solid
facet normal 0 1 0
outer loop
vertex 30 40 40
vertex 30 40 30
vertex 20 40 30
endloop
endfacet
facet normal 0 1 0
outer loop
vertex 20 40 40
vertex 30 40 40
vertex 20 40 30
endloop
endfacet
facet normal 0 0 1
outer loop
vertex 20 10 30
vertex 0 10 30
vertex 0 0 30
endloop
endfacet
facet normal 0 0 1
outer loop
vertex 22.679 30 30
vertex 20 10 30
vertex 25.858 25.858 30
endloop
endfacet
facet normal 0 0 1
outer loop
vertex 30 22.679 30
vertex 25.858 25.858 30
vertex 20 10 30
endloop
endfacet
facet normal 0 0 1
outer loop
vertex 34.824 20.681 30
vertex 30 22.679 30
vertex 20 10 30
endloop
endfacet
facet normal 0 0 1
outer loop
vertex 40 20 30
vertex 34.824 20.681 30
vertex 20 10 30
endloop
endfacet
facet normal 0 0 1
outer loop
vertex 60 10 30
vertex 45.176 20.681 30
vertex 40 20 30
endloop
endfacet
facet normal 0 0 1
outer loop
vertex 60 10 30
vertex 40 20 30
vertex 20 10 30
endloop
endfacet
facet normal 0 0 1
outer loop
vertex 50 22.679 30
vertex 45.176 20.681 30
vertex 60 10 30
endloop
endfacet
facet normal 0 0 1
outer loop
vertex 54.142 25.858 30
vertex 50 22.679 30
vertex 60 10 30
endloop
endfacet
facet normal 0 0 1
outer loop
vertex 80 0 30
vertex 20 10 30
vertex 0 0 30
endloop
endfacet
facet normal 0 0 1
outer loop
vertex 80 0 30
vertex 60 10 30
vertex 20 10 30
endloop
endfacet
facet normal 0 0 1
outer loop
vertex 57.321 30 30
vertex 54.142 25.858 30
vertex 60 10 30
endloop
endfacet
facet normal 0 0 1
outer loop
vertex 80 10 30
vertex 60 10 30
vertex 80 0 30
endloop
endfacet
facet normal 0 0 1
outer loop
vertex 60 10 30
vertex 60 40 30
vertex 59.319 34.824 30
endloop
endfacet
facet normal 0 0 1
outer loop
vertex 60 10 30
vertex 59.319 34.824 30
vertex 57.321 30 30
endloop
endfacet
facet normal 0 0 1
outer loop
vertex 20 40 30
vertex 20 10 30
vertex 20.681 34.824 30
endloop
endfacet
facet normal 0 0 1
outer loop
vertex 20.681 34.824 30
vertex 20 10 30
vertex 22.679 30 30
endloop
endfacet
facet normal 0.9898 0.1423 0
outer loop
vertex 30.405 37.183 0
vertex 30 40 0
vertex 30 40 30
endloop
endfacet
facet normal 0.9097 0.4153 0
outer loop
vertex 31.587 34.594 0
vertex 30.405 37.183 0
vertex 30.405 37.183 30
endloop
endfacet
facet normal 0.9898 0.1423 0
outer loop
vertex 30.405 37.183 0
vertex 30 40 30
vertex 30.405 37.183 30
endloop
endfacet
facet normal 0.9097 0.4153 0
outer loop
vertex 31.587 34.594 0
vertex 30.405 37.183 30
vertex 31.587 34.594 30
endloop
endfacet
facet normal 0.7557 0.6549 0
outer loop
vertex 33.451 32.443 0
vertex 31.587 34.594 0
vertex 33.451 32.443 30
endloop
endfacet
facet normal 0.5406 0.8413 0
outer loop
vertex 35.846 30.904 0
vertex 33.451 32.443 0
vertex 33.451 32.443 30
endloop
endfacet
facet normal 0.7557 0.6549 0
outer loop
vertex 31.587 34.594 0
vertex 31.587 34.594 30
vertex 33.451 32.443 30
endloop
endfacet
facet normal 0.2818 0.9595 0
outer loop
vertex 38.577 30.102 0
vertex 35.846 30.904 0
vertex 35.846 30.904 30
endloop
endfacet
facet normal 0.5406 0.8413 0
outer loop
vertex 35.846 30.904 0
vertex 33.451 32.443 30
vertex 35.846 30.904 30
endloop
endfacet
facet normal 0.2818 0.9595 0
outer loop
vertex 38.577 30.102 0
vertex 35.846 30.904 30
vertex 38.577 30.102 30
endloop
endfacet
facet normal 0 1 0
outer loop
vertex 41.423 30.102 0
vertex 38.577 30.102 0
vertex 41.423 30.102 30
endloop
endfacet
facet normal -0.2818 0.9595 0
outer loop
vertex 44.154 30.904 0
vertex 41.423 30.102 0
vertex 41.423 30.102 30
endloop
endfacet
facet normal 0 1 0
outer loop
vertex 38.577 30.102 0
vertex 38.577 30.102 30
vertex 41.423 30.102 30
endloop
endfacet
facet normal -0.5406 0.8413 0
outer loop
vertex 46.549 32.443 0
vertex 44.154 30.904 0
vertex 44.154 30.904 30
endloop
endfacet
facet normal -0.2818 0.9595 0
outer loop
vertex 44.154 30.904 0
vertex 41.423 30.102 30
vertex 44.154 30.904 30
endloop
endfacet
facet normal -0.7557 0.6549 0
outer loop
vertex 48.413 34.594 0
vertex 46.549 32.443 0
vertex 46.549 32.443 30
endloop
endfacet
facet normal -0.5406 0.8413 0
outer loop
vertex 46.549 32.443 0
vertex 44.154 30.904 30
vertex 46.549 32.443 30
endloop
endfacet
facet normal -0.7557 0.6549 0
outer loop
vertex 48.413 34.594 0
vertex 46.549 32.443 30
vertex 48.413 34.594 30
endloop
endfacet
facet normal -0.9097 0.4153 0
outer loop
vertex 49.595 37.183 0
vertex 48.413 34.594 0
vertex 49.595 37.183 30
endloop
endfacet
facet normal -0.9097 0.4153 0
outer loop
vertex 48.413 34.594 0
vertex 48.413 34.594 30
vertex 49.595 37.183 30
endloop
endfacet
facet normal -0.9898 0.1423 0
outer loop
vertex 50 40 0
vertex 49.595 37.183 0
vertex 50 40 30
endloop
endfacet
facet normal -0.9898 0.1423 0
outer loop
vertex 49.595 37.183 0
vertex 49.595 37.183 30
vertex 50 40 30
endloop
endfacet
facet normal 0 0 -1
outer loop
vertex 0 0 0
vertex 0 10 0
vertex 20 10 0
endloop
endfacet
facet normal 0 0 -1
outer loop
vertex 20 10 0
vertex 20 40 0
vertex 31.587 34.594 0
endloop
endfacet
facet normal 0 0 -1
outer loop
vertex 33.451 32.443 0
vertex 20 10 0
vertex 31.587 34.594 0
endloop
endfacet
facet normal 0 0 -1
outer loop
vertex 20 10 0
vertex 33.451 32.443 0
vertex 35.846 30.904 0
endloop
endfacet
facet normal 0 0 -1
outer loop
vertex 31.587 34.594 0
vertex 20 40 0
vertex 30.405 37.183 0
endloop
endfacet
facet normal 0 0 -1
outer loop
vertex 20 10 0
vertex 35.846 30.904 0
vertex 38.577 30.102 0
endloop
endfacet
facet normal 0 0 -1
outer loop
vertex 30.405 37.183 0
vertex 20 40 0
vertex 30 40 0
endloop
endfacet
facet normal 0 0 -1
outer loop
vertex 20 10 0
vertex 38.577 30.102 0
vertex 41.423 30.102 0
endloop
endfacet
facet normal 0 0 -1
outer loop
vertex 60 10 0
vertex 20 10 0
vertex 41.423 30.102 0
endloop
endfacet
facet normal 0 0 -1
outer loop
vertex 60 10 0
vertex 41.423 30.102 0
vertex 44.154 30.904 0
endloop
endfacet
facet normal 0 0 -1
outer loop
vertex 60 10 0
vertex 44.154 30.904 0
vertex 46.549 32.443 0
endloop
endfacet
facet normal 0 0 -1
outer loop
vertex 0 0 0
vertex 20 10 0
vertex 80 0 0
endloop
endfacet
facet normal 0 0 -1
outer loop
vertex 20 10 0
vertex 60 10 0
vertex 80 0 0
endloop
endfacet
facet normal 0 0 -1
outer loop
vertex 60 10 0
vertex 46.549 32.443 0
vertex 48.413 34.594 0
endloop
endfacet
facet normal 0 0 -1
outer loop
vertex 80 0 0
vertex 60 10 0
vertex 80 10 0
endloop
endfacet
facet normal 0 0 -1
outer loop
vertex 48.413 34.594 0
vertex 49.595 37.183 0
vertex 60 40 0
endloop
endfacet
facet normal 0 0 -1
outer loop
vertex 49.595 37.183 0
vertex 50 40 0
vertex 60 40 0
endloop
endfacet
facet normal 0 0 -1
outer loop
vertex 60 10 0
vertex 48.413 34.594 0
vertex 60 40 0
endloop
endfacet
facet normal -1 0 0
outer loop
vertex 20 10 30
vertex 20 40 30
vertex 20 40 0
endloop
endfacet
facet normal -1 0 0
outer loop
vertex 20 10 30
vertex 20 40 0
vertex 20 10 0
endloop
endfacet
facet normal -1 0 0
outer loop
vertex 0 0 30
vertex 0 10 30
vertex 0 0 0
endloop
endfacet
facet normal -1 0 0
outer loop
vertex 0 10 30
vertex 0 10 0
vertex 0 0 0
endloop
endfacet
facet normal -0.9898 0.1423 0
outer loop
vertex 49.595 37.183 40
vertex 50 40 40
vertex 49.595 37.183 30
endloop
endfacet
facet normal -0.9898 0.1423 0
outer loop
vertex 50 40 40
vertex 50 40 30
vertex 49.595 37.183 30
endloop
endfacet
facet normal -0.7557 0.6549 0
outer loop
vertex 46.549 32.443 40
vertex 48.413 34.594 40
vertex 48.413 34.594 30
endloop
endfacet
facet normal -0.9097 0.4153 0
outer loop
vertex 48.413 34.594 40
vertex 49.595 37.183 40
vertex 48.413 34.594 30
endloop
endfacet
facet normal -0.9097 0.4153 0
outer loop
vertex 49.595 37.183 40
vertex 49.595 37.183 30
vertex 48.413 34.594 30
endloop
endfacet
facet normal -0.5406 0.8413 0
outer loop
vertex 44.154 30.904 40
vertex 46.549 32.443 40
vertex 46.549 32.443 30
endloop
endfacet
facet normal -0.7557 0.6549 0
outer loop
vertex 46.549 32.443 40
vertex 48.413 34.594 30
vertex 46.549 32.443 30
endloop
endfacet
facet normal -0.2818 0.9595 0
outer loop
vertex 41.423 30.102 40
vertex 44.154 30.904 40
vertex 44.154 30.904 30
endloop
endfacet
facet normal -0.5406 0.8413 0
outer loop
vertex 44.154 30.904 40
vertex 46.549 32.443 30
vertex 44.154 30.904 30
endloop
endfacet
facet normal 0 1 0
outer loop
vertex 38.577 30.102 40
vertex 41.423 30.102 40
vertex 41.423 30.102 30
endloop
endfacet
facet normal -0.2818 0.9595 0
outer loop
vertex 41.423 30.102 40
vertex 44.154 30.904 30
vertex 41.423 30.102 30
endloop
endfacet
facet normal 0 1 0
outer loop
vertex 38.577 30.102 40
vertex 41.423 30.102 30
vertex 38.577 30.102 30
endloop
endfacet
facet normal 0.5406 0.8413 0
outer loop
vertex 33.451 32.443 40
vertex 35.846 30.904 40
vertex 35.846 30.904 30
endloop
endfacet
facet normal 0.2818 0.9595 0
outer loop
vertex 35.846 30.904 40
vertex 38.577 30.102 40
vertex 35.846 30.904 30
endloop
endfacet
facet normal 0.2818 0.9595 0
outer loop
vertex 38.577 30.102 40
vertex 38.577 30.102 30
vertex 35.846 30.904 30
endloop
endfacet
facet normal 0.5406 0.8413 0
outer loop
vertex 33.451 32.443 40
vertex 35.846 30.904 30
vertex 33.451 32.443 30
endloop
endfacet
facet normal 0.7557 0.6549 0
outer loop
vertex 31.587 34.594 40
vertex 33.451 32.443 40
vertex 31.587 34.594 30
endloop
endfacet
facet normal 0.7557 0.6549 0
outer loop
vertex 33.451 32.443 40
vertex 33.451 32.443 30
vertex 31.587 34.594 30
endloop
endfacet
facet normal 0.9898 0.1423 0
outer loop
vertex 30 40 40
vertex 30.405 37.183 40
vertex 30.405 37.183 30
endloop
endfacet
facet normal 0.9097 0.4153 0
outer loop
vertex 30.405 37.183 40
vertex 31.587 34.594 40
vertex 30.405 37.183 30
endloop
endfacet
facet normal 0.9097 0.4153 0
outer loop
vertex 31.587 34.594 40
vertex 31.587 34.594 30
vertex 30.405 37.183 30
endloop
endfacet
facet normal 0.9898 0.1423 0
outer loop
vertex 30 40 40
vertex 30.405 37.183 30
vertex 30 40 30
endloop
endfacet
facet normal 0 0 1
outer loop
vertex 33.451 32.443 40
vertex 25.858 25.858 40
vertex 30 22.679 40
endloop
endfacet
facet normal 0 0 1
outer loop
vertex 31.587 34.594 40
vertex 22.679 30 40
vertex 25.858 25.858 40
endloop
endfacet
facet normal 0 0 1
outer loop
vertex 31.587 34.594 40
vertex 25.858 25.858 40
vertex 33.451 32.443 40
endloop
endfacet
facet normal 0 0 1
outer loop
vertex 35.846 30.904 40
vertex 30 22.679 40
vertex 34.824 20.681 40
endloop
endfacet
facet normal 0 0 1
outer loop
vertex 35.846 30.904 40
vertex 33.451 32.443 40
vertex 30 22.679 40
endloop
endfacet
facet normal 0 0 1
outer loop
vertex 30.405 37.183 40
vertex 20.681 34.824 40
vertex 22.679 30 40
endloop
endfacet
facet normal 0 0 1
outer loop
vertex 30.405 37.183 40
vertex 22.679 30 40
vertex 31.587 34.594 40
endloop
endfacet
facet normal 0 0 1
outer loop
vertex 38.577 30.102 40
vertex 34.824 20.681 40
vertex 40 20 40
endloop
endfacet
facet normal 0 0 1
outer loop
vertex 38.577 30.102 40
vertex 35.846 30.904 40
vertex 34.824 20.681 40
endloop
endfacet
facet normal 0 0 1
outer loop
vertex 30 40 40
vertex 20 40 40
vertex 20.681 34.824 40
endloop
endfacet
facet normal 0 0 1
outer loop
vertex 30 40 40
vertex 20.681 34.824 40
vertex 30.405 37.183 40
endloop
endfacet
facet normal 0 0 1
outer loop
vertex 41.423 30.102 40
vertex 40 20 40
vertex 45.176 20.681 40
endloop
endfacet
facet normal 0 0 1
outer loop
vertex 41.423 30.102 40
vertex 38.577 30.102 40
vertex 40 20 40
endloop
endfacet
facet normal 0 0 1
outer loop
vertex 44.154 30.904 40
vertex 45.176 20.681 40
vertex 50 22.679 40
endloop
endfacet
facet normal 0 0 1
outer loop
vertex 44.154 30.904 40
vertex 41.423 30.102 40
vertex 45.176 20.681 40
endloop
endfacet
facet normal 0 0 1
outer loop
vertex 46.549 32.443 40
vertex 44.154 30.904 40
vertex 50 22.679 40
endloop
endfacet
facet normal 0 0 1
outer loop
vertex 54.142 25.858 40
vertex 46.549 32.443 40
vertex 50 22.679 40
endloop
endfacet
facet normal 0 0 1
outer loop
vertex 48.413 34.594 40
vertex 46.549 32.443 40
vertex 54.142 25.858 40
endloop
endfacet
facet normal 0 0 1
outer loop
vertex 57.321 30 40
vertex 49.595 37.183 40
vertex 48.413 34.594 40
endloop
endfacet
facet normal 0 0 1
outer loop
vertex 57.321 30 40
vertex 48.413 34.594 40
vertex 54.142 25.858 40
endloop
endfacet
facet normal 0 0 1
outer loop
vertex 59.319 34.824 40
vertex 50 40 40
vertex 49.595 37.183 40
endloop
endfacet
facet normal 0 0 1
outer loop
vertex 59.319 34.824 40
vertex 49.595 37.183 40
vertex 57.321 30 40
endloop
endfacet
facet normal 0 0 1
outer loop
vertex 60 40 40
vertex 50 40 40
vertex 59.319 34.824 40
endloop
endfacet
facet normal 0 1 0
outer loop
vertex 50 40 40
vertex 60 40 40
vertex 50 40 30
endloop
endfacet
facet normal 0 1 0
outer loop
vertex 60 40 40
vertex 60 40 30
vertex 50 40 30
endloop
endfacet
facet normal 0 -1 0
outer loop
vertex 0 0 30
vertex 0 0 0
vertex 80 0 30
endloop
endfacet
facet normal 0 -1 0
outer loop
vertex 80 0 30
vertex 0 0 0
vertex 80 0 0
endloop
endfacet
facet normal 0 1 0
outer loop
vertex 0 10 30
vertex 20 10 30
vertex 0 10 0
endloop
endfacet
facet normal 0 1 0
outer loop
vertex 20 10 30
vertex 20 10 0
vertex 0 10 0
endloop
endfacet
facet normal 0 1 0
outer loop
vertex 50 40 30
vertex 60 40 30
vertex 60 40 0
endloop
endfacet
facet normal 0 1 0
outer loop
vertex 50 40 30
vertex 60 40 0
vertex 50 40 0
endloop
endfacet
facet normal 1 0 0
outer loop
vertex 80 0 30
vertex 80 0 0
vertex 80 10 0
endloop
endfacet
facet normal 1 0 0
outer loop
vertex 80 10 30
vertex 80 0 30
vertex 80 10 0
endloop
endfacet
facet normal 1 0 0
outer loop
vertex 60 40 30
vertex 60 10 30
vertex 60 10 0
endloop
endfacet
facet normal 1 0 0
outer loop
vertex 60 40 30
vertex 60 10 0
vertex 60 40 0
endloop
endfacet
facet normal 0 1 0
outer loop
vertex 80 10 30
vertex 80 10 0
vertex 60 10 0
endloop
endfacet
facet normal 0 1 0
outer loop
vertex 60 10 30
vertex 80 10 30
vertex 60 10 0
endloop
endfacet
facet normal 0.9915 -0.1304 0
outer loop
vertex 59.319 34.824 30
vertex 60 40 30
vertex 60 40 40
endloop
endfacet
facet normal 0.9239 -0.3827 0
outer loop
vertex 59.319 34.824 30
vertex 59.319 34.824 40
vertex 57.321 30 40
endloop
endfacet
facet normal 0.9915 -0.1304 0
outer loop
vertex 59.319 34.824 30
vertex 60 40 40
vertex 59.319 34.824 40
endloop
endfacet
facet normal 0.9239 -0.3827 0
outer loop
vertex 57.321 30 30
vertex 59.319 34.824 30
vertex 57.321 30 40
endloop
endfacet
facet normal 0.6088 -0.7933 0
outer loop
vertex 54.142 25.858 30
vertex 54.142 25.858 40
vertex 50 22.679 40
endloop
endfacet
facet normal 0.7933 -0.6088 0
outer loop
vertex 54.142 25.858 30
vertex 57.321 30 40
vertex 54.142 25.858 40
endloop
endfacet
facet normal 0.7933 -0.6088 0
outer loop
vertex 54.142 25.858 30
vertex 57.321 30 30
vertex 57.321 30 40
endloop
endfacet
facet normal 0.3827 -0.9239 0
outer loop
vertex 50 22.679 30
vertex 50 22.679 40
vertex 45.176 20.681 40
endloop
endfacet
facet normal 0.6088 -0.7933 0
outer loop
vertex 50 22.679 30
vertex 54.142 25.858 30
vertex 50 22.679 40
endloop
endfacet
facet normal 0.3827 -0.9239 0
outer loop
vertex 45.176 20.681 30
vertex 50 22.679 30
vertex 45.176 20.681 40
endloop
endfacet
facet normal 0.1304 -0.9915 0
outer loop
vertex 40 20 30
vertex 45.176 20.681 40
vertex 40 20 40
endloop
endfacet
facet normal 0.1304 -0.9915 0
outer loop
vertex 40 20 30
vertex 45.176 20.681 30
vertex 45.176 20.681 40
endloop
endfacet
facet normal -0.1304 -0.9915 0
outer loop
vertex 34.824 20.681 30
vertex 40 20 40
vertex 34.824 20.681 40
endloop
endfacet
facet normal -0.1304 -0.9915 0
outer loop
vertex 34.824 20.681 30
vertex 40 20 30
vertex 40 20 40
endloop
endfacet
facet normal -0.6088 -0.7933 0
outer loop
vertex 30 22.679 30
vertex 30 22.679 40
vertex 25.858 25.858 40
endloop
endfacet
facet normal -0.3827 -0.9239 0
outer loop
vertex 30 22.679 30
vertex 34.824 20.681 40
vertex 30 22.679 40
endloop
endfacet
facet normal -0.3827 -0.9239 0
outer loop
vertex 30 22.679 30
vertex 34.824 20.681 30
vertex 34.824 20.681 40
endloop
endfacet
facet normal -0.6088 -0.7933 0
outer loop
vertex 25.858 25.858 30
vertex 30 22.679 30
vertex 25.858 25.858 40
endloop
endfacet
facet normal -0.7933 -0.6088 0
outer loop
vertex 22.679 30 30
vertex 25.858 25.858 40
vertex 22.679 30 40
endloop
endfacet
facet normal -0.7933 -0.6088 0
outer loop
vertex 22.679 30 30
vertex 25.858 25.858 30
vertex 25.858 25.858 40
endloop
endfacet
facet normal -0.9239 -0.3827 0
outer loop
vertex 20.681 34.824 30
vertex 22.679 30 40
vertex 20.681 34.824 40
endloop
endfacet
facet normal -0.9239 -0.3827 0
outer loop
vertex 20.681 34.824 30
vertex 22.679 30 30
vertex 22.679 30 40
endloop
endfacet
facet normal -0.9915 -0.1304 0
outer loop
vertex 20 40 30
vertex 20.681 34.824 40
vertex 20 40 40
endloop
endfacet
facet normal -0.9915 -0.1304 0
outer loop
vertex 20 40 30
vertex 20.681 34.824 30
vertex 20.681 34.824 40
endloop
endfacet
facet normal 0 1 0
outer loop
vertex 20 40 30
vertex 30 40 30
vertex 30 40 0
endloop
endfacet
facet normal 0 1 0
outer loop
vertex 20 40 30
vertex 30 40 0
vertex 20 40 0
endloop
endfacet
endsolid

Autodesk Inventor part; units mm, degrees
ref_plane "YZ Plane" through (0, 0, 0) normal (1, 0, 0) x (0, 1, 0)
ref_plane "XZ Plane" through (0, 0, 0) normal (0, 1, 0) x (-1, 0, 0)
ref_plane "XY Plane" through (0, 0, 0) normal (0, 0, 1) x (1, 0, 0)
sketch "草圖1" plane through (0, 0, 0) normal (0, 0, 1) x (1, 0, 0)
  line L0 (0, 0) -> (80, 0)
  line L1 (80, 0) -> (80, 10)
  line L2 (80, 10) -> (0, 10)
  line L3 (0, 10) -> (0, 0)
  dimension "d0" = 80
  dimension "d1" = 10
extrude "擠出1" add sketch "草圖1" along normal blind 30
sketch "草圖2" plane through (0, 0, 30) normal (0, 0, 1) x (1, 0, 0)
  line L0 (80, 10) -> (0, 10) projected
  line L1 (20, 10) -> (60, 10)
  line L2 (60, 10) -> (60, 40)
  line L3 (60, 40) -> (20, 40)
  line L4 (20, 40) -> (20, 10)
  point P0 (0, 0)
  dimension "d4" = 20
  dimension "d5" = 20
  dimension "d6" = 30
extrude "擠出2" add sketch "草圖2" against normal up to surface (30 mm away)
sketch "草圖3" plane through (0, 0, 30) normal (0, 0, 1) x (1, 0, 0)
  line L0 (60, 40) -> (20, 40) projected
  circle A0 centre (40, 40) radius 10
  point P0 (0, 0)
  dimension "d9" = 20
extrude "擠出3" cut sketch "草圖3" against normal blind 30
sketch "草圖4" plane through (0, 0, 30) normal (0, 0, 1) x (1, 0, 0)
  arc A0 (30, 40) -> (50, 40) centre (40, 40) ccw projected
  line L0 (30, 40) -> (20, 40) projected
  circle A1 centre (40, 40) radius 20
  circle A2 centre (40, 40) radius 10
  line L1 (20, 40) -> (30, 40)
  line L2 (60, 40) -> (50, 40) projected
  line L3 (50, 40) -> (60, 40)
  line L4 (60, 10) -> (60, 40) projected
  point P0 (0, 0)
extrude "擠出4" add sketch "草圖4" along normal blind 10 contours A0 L2 A1 L0
properties part number "1"
